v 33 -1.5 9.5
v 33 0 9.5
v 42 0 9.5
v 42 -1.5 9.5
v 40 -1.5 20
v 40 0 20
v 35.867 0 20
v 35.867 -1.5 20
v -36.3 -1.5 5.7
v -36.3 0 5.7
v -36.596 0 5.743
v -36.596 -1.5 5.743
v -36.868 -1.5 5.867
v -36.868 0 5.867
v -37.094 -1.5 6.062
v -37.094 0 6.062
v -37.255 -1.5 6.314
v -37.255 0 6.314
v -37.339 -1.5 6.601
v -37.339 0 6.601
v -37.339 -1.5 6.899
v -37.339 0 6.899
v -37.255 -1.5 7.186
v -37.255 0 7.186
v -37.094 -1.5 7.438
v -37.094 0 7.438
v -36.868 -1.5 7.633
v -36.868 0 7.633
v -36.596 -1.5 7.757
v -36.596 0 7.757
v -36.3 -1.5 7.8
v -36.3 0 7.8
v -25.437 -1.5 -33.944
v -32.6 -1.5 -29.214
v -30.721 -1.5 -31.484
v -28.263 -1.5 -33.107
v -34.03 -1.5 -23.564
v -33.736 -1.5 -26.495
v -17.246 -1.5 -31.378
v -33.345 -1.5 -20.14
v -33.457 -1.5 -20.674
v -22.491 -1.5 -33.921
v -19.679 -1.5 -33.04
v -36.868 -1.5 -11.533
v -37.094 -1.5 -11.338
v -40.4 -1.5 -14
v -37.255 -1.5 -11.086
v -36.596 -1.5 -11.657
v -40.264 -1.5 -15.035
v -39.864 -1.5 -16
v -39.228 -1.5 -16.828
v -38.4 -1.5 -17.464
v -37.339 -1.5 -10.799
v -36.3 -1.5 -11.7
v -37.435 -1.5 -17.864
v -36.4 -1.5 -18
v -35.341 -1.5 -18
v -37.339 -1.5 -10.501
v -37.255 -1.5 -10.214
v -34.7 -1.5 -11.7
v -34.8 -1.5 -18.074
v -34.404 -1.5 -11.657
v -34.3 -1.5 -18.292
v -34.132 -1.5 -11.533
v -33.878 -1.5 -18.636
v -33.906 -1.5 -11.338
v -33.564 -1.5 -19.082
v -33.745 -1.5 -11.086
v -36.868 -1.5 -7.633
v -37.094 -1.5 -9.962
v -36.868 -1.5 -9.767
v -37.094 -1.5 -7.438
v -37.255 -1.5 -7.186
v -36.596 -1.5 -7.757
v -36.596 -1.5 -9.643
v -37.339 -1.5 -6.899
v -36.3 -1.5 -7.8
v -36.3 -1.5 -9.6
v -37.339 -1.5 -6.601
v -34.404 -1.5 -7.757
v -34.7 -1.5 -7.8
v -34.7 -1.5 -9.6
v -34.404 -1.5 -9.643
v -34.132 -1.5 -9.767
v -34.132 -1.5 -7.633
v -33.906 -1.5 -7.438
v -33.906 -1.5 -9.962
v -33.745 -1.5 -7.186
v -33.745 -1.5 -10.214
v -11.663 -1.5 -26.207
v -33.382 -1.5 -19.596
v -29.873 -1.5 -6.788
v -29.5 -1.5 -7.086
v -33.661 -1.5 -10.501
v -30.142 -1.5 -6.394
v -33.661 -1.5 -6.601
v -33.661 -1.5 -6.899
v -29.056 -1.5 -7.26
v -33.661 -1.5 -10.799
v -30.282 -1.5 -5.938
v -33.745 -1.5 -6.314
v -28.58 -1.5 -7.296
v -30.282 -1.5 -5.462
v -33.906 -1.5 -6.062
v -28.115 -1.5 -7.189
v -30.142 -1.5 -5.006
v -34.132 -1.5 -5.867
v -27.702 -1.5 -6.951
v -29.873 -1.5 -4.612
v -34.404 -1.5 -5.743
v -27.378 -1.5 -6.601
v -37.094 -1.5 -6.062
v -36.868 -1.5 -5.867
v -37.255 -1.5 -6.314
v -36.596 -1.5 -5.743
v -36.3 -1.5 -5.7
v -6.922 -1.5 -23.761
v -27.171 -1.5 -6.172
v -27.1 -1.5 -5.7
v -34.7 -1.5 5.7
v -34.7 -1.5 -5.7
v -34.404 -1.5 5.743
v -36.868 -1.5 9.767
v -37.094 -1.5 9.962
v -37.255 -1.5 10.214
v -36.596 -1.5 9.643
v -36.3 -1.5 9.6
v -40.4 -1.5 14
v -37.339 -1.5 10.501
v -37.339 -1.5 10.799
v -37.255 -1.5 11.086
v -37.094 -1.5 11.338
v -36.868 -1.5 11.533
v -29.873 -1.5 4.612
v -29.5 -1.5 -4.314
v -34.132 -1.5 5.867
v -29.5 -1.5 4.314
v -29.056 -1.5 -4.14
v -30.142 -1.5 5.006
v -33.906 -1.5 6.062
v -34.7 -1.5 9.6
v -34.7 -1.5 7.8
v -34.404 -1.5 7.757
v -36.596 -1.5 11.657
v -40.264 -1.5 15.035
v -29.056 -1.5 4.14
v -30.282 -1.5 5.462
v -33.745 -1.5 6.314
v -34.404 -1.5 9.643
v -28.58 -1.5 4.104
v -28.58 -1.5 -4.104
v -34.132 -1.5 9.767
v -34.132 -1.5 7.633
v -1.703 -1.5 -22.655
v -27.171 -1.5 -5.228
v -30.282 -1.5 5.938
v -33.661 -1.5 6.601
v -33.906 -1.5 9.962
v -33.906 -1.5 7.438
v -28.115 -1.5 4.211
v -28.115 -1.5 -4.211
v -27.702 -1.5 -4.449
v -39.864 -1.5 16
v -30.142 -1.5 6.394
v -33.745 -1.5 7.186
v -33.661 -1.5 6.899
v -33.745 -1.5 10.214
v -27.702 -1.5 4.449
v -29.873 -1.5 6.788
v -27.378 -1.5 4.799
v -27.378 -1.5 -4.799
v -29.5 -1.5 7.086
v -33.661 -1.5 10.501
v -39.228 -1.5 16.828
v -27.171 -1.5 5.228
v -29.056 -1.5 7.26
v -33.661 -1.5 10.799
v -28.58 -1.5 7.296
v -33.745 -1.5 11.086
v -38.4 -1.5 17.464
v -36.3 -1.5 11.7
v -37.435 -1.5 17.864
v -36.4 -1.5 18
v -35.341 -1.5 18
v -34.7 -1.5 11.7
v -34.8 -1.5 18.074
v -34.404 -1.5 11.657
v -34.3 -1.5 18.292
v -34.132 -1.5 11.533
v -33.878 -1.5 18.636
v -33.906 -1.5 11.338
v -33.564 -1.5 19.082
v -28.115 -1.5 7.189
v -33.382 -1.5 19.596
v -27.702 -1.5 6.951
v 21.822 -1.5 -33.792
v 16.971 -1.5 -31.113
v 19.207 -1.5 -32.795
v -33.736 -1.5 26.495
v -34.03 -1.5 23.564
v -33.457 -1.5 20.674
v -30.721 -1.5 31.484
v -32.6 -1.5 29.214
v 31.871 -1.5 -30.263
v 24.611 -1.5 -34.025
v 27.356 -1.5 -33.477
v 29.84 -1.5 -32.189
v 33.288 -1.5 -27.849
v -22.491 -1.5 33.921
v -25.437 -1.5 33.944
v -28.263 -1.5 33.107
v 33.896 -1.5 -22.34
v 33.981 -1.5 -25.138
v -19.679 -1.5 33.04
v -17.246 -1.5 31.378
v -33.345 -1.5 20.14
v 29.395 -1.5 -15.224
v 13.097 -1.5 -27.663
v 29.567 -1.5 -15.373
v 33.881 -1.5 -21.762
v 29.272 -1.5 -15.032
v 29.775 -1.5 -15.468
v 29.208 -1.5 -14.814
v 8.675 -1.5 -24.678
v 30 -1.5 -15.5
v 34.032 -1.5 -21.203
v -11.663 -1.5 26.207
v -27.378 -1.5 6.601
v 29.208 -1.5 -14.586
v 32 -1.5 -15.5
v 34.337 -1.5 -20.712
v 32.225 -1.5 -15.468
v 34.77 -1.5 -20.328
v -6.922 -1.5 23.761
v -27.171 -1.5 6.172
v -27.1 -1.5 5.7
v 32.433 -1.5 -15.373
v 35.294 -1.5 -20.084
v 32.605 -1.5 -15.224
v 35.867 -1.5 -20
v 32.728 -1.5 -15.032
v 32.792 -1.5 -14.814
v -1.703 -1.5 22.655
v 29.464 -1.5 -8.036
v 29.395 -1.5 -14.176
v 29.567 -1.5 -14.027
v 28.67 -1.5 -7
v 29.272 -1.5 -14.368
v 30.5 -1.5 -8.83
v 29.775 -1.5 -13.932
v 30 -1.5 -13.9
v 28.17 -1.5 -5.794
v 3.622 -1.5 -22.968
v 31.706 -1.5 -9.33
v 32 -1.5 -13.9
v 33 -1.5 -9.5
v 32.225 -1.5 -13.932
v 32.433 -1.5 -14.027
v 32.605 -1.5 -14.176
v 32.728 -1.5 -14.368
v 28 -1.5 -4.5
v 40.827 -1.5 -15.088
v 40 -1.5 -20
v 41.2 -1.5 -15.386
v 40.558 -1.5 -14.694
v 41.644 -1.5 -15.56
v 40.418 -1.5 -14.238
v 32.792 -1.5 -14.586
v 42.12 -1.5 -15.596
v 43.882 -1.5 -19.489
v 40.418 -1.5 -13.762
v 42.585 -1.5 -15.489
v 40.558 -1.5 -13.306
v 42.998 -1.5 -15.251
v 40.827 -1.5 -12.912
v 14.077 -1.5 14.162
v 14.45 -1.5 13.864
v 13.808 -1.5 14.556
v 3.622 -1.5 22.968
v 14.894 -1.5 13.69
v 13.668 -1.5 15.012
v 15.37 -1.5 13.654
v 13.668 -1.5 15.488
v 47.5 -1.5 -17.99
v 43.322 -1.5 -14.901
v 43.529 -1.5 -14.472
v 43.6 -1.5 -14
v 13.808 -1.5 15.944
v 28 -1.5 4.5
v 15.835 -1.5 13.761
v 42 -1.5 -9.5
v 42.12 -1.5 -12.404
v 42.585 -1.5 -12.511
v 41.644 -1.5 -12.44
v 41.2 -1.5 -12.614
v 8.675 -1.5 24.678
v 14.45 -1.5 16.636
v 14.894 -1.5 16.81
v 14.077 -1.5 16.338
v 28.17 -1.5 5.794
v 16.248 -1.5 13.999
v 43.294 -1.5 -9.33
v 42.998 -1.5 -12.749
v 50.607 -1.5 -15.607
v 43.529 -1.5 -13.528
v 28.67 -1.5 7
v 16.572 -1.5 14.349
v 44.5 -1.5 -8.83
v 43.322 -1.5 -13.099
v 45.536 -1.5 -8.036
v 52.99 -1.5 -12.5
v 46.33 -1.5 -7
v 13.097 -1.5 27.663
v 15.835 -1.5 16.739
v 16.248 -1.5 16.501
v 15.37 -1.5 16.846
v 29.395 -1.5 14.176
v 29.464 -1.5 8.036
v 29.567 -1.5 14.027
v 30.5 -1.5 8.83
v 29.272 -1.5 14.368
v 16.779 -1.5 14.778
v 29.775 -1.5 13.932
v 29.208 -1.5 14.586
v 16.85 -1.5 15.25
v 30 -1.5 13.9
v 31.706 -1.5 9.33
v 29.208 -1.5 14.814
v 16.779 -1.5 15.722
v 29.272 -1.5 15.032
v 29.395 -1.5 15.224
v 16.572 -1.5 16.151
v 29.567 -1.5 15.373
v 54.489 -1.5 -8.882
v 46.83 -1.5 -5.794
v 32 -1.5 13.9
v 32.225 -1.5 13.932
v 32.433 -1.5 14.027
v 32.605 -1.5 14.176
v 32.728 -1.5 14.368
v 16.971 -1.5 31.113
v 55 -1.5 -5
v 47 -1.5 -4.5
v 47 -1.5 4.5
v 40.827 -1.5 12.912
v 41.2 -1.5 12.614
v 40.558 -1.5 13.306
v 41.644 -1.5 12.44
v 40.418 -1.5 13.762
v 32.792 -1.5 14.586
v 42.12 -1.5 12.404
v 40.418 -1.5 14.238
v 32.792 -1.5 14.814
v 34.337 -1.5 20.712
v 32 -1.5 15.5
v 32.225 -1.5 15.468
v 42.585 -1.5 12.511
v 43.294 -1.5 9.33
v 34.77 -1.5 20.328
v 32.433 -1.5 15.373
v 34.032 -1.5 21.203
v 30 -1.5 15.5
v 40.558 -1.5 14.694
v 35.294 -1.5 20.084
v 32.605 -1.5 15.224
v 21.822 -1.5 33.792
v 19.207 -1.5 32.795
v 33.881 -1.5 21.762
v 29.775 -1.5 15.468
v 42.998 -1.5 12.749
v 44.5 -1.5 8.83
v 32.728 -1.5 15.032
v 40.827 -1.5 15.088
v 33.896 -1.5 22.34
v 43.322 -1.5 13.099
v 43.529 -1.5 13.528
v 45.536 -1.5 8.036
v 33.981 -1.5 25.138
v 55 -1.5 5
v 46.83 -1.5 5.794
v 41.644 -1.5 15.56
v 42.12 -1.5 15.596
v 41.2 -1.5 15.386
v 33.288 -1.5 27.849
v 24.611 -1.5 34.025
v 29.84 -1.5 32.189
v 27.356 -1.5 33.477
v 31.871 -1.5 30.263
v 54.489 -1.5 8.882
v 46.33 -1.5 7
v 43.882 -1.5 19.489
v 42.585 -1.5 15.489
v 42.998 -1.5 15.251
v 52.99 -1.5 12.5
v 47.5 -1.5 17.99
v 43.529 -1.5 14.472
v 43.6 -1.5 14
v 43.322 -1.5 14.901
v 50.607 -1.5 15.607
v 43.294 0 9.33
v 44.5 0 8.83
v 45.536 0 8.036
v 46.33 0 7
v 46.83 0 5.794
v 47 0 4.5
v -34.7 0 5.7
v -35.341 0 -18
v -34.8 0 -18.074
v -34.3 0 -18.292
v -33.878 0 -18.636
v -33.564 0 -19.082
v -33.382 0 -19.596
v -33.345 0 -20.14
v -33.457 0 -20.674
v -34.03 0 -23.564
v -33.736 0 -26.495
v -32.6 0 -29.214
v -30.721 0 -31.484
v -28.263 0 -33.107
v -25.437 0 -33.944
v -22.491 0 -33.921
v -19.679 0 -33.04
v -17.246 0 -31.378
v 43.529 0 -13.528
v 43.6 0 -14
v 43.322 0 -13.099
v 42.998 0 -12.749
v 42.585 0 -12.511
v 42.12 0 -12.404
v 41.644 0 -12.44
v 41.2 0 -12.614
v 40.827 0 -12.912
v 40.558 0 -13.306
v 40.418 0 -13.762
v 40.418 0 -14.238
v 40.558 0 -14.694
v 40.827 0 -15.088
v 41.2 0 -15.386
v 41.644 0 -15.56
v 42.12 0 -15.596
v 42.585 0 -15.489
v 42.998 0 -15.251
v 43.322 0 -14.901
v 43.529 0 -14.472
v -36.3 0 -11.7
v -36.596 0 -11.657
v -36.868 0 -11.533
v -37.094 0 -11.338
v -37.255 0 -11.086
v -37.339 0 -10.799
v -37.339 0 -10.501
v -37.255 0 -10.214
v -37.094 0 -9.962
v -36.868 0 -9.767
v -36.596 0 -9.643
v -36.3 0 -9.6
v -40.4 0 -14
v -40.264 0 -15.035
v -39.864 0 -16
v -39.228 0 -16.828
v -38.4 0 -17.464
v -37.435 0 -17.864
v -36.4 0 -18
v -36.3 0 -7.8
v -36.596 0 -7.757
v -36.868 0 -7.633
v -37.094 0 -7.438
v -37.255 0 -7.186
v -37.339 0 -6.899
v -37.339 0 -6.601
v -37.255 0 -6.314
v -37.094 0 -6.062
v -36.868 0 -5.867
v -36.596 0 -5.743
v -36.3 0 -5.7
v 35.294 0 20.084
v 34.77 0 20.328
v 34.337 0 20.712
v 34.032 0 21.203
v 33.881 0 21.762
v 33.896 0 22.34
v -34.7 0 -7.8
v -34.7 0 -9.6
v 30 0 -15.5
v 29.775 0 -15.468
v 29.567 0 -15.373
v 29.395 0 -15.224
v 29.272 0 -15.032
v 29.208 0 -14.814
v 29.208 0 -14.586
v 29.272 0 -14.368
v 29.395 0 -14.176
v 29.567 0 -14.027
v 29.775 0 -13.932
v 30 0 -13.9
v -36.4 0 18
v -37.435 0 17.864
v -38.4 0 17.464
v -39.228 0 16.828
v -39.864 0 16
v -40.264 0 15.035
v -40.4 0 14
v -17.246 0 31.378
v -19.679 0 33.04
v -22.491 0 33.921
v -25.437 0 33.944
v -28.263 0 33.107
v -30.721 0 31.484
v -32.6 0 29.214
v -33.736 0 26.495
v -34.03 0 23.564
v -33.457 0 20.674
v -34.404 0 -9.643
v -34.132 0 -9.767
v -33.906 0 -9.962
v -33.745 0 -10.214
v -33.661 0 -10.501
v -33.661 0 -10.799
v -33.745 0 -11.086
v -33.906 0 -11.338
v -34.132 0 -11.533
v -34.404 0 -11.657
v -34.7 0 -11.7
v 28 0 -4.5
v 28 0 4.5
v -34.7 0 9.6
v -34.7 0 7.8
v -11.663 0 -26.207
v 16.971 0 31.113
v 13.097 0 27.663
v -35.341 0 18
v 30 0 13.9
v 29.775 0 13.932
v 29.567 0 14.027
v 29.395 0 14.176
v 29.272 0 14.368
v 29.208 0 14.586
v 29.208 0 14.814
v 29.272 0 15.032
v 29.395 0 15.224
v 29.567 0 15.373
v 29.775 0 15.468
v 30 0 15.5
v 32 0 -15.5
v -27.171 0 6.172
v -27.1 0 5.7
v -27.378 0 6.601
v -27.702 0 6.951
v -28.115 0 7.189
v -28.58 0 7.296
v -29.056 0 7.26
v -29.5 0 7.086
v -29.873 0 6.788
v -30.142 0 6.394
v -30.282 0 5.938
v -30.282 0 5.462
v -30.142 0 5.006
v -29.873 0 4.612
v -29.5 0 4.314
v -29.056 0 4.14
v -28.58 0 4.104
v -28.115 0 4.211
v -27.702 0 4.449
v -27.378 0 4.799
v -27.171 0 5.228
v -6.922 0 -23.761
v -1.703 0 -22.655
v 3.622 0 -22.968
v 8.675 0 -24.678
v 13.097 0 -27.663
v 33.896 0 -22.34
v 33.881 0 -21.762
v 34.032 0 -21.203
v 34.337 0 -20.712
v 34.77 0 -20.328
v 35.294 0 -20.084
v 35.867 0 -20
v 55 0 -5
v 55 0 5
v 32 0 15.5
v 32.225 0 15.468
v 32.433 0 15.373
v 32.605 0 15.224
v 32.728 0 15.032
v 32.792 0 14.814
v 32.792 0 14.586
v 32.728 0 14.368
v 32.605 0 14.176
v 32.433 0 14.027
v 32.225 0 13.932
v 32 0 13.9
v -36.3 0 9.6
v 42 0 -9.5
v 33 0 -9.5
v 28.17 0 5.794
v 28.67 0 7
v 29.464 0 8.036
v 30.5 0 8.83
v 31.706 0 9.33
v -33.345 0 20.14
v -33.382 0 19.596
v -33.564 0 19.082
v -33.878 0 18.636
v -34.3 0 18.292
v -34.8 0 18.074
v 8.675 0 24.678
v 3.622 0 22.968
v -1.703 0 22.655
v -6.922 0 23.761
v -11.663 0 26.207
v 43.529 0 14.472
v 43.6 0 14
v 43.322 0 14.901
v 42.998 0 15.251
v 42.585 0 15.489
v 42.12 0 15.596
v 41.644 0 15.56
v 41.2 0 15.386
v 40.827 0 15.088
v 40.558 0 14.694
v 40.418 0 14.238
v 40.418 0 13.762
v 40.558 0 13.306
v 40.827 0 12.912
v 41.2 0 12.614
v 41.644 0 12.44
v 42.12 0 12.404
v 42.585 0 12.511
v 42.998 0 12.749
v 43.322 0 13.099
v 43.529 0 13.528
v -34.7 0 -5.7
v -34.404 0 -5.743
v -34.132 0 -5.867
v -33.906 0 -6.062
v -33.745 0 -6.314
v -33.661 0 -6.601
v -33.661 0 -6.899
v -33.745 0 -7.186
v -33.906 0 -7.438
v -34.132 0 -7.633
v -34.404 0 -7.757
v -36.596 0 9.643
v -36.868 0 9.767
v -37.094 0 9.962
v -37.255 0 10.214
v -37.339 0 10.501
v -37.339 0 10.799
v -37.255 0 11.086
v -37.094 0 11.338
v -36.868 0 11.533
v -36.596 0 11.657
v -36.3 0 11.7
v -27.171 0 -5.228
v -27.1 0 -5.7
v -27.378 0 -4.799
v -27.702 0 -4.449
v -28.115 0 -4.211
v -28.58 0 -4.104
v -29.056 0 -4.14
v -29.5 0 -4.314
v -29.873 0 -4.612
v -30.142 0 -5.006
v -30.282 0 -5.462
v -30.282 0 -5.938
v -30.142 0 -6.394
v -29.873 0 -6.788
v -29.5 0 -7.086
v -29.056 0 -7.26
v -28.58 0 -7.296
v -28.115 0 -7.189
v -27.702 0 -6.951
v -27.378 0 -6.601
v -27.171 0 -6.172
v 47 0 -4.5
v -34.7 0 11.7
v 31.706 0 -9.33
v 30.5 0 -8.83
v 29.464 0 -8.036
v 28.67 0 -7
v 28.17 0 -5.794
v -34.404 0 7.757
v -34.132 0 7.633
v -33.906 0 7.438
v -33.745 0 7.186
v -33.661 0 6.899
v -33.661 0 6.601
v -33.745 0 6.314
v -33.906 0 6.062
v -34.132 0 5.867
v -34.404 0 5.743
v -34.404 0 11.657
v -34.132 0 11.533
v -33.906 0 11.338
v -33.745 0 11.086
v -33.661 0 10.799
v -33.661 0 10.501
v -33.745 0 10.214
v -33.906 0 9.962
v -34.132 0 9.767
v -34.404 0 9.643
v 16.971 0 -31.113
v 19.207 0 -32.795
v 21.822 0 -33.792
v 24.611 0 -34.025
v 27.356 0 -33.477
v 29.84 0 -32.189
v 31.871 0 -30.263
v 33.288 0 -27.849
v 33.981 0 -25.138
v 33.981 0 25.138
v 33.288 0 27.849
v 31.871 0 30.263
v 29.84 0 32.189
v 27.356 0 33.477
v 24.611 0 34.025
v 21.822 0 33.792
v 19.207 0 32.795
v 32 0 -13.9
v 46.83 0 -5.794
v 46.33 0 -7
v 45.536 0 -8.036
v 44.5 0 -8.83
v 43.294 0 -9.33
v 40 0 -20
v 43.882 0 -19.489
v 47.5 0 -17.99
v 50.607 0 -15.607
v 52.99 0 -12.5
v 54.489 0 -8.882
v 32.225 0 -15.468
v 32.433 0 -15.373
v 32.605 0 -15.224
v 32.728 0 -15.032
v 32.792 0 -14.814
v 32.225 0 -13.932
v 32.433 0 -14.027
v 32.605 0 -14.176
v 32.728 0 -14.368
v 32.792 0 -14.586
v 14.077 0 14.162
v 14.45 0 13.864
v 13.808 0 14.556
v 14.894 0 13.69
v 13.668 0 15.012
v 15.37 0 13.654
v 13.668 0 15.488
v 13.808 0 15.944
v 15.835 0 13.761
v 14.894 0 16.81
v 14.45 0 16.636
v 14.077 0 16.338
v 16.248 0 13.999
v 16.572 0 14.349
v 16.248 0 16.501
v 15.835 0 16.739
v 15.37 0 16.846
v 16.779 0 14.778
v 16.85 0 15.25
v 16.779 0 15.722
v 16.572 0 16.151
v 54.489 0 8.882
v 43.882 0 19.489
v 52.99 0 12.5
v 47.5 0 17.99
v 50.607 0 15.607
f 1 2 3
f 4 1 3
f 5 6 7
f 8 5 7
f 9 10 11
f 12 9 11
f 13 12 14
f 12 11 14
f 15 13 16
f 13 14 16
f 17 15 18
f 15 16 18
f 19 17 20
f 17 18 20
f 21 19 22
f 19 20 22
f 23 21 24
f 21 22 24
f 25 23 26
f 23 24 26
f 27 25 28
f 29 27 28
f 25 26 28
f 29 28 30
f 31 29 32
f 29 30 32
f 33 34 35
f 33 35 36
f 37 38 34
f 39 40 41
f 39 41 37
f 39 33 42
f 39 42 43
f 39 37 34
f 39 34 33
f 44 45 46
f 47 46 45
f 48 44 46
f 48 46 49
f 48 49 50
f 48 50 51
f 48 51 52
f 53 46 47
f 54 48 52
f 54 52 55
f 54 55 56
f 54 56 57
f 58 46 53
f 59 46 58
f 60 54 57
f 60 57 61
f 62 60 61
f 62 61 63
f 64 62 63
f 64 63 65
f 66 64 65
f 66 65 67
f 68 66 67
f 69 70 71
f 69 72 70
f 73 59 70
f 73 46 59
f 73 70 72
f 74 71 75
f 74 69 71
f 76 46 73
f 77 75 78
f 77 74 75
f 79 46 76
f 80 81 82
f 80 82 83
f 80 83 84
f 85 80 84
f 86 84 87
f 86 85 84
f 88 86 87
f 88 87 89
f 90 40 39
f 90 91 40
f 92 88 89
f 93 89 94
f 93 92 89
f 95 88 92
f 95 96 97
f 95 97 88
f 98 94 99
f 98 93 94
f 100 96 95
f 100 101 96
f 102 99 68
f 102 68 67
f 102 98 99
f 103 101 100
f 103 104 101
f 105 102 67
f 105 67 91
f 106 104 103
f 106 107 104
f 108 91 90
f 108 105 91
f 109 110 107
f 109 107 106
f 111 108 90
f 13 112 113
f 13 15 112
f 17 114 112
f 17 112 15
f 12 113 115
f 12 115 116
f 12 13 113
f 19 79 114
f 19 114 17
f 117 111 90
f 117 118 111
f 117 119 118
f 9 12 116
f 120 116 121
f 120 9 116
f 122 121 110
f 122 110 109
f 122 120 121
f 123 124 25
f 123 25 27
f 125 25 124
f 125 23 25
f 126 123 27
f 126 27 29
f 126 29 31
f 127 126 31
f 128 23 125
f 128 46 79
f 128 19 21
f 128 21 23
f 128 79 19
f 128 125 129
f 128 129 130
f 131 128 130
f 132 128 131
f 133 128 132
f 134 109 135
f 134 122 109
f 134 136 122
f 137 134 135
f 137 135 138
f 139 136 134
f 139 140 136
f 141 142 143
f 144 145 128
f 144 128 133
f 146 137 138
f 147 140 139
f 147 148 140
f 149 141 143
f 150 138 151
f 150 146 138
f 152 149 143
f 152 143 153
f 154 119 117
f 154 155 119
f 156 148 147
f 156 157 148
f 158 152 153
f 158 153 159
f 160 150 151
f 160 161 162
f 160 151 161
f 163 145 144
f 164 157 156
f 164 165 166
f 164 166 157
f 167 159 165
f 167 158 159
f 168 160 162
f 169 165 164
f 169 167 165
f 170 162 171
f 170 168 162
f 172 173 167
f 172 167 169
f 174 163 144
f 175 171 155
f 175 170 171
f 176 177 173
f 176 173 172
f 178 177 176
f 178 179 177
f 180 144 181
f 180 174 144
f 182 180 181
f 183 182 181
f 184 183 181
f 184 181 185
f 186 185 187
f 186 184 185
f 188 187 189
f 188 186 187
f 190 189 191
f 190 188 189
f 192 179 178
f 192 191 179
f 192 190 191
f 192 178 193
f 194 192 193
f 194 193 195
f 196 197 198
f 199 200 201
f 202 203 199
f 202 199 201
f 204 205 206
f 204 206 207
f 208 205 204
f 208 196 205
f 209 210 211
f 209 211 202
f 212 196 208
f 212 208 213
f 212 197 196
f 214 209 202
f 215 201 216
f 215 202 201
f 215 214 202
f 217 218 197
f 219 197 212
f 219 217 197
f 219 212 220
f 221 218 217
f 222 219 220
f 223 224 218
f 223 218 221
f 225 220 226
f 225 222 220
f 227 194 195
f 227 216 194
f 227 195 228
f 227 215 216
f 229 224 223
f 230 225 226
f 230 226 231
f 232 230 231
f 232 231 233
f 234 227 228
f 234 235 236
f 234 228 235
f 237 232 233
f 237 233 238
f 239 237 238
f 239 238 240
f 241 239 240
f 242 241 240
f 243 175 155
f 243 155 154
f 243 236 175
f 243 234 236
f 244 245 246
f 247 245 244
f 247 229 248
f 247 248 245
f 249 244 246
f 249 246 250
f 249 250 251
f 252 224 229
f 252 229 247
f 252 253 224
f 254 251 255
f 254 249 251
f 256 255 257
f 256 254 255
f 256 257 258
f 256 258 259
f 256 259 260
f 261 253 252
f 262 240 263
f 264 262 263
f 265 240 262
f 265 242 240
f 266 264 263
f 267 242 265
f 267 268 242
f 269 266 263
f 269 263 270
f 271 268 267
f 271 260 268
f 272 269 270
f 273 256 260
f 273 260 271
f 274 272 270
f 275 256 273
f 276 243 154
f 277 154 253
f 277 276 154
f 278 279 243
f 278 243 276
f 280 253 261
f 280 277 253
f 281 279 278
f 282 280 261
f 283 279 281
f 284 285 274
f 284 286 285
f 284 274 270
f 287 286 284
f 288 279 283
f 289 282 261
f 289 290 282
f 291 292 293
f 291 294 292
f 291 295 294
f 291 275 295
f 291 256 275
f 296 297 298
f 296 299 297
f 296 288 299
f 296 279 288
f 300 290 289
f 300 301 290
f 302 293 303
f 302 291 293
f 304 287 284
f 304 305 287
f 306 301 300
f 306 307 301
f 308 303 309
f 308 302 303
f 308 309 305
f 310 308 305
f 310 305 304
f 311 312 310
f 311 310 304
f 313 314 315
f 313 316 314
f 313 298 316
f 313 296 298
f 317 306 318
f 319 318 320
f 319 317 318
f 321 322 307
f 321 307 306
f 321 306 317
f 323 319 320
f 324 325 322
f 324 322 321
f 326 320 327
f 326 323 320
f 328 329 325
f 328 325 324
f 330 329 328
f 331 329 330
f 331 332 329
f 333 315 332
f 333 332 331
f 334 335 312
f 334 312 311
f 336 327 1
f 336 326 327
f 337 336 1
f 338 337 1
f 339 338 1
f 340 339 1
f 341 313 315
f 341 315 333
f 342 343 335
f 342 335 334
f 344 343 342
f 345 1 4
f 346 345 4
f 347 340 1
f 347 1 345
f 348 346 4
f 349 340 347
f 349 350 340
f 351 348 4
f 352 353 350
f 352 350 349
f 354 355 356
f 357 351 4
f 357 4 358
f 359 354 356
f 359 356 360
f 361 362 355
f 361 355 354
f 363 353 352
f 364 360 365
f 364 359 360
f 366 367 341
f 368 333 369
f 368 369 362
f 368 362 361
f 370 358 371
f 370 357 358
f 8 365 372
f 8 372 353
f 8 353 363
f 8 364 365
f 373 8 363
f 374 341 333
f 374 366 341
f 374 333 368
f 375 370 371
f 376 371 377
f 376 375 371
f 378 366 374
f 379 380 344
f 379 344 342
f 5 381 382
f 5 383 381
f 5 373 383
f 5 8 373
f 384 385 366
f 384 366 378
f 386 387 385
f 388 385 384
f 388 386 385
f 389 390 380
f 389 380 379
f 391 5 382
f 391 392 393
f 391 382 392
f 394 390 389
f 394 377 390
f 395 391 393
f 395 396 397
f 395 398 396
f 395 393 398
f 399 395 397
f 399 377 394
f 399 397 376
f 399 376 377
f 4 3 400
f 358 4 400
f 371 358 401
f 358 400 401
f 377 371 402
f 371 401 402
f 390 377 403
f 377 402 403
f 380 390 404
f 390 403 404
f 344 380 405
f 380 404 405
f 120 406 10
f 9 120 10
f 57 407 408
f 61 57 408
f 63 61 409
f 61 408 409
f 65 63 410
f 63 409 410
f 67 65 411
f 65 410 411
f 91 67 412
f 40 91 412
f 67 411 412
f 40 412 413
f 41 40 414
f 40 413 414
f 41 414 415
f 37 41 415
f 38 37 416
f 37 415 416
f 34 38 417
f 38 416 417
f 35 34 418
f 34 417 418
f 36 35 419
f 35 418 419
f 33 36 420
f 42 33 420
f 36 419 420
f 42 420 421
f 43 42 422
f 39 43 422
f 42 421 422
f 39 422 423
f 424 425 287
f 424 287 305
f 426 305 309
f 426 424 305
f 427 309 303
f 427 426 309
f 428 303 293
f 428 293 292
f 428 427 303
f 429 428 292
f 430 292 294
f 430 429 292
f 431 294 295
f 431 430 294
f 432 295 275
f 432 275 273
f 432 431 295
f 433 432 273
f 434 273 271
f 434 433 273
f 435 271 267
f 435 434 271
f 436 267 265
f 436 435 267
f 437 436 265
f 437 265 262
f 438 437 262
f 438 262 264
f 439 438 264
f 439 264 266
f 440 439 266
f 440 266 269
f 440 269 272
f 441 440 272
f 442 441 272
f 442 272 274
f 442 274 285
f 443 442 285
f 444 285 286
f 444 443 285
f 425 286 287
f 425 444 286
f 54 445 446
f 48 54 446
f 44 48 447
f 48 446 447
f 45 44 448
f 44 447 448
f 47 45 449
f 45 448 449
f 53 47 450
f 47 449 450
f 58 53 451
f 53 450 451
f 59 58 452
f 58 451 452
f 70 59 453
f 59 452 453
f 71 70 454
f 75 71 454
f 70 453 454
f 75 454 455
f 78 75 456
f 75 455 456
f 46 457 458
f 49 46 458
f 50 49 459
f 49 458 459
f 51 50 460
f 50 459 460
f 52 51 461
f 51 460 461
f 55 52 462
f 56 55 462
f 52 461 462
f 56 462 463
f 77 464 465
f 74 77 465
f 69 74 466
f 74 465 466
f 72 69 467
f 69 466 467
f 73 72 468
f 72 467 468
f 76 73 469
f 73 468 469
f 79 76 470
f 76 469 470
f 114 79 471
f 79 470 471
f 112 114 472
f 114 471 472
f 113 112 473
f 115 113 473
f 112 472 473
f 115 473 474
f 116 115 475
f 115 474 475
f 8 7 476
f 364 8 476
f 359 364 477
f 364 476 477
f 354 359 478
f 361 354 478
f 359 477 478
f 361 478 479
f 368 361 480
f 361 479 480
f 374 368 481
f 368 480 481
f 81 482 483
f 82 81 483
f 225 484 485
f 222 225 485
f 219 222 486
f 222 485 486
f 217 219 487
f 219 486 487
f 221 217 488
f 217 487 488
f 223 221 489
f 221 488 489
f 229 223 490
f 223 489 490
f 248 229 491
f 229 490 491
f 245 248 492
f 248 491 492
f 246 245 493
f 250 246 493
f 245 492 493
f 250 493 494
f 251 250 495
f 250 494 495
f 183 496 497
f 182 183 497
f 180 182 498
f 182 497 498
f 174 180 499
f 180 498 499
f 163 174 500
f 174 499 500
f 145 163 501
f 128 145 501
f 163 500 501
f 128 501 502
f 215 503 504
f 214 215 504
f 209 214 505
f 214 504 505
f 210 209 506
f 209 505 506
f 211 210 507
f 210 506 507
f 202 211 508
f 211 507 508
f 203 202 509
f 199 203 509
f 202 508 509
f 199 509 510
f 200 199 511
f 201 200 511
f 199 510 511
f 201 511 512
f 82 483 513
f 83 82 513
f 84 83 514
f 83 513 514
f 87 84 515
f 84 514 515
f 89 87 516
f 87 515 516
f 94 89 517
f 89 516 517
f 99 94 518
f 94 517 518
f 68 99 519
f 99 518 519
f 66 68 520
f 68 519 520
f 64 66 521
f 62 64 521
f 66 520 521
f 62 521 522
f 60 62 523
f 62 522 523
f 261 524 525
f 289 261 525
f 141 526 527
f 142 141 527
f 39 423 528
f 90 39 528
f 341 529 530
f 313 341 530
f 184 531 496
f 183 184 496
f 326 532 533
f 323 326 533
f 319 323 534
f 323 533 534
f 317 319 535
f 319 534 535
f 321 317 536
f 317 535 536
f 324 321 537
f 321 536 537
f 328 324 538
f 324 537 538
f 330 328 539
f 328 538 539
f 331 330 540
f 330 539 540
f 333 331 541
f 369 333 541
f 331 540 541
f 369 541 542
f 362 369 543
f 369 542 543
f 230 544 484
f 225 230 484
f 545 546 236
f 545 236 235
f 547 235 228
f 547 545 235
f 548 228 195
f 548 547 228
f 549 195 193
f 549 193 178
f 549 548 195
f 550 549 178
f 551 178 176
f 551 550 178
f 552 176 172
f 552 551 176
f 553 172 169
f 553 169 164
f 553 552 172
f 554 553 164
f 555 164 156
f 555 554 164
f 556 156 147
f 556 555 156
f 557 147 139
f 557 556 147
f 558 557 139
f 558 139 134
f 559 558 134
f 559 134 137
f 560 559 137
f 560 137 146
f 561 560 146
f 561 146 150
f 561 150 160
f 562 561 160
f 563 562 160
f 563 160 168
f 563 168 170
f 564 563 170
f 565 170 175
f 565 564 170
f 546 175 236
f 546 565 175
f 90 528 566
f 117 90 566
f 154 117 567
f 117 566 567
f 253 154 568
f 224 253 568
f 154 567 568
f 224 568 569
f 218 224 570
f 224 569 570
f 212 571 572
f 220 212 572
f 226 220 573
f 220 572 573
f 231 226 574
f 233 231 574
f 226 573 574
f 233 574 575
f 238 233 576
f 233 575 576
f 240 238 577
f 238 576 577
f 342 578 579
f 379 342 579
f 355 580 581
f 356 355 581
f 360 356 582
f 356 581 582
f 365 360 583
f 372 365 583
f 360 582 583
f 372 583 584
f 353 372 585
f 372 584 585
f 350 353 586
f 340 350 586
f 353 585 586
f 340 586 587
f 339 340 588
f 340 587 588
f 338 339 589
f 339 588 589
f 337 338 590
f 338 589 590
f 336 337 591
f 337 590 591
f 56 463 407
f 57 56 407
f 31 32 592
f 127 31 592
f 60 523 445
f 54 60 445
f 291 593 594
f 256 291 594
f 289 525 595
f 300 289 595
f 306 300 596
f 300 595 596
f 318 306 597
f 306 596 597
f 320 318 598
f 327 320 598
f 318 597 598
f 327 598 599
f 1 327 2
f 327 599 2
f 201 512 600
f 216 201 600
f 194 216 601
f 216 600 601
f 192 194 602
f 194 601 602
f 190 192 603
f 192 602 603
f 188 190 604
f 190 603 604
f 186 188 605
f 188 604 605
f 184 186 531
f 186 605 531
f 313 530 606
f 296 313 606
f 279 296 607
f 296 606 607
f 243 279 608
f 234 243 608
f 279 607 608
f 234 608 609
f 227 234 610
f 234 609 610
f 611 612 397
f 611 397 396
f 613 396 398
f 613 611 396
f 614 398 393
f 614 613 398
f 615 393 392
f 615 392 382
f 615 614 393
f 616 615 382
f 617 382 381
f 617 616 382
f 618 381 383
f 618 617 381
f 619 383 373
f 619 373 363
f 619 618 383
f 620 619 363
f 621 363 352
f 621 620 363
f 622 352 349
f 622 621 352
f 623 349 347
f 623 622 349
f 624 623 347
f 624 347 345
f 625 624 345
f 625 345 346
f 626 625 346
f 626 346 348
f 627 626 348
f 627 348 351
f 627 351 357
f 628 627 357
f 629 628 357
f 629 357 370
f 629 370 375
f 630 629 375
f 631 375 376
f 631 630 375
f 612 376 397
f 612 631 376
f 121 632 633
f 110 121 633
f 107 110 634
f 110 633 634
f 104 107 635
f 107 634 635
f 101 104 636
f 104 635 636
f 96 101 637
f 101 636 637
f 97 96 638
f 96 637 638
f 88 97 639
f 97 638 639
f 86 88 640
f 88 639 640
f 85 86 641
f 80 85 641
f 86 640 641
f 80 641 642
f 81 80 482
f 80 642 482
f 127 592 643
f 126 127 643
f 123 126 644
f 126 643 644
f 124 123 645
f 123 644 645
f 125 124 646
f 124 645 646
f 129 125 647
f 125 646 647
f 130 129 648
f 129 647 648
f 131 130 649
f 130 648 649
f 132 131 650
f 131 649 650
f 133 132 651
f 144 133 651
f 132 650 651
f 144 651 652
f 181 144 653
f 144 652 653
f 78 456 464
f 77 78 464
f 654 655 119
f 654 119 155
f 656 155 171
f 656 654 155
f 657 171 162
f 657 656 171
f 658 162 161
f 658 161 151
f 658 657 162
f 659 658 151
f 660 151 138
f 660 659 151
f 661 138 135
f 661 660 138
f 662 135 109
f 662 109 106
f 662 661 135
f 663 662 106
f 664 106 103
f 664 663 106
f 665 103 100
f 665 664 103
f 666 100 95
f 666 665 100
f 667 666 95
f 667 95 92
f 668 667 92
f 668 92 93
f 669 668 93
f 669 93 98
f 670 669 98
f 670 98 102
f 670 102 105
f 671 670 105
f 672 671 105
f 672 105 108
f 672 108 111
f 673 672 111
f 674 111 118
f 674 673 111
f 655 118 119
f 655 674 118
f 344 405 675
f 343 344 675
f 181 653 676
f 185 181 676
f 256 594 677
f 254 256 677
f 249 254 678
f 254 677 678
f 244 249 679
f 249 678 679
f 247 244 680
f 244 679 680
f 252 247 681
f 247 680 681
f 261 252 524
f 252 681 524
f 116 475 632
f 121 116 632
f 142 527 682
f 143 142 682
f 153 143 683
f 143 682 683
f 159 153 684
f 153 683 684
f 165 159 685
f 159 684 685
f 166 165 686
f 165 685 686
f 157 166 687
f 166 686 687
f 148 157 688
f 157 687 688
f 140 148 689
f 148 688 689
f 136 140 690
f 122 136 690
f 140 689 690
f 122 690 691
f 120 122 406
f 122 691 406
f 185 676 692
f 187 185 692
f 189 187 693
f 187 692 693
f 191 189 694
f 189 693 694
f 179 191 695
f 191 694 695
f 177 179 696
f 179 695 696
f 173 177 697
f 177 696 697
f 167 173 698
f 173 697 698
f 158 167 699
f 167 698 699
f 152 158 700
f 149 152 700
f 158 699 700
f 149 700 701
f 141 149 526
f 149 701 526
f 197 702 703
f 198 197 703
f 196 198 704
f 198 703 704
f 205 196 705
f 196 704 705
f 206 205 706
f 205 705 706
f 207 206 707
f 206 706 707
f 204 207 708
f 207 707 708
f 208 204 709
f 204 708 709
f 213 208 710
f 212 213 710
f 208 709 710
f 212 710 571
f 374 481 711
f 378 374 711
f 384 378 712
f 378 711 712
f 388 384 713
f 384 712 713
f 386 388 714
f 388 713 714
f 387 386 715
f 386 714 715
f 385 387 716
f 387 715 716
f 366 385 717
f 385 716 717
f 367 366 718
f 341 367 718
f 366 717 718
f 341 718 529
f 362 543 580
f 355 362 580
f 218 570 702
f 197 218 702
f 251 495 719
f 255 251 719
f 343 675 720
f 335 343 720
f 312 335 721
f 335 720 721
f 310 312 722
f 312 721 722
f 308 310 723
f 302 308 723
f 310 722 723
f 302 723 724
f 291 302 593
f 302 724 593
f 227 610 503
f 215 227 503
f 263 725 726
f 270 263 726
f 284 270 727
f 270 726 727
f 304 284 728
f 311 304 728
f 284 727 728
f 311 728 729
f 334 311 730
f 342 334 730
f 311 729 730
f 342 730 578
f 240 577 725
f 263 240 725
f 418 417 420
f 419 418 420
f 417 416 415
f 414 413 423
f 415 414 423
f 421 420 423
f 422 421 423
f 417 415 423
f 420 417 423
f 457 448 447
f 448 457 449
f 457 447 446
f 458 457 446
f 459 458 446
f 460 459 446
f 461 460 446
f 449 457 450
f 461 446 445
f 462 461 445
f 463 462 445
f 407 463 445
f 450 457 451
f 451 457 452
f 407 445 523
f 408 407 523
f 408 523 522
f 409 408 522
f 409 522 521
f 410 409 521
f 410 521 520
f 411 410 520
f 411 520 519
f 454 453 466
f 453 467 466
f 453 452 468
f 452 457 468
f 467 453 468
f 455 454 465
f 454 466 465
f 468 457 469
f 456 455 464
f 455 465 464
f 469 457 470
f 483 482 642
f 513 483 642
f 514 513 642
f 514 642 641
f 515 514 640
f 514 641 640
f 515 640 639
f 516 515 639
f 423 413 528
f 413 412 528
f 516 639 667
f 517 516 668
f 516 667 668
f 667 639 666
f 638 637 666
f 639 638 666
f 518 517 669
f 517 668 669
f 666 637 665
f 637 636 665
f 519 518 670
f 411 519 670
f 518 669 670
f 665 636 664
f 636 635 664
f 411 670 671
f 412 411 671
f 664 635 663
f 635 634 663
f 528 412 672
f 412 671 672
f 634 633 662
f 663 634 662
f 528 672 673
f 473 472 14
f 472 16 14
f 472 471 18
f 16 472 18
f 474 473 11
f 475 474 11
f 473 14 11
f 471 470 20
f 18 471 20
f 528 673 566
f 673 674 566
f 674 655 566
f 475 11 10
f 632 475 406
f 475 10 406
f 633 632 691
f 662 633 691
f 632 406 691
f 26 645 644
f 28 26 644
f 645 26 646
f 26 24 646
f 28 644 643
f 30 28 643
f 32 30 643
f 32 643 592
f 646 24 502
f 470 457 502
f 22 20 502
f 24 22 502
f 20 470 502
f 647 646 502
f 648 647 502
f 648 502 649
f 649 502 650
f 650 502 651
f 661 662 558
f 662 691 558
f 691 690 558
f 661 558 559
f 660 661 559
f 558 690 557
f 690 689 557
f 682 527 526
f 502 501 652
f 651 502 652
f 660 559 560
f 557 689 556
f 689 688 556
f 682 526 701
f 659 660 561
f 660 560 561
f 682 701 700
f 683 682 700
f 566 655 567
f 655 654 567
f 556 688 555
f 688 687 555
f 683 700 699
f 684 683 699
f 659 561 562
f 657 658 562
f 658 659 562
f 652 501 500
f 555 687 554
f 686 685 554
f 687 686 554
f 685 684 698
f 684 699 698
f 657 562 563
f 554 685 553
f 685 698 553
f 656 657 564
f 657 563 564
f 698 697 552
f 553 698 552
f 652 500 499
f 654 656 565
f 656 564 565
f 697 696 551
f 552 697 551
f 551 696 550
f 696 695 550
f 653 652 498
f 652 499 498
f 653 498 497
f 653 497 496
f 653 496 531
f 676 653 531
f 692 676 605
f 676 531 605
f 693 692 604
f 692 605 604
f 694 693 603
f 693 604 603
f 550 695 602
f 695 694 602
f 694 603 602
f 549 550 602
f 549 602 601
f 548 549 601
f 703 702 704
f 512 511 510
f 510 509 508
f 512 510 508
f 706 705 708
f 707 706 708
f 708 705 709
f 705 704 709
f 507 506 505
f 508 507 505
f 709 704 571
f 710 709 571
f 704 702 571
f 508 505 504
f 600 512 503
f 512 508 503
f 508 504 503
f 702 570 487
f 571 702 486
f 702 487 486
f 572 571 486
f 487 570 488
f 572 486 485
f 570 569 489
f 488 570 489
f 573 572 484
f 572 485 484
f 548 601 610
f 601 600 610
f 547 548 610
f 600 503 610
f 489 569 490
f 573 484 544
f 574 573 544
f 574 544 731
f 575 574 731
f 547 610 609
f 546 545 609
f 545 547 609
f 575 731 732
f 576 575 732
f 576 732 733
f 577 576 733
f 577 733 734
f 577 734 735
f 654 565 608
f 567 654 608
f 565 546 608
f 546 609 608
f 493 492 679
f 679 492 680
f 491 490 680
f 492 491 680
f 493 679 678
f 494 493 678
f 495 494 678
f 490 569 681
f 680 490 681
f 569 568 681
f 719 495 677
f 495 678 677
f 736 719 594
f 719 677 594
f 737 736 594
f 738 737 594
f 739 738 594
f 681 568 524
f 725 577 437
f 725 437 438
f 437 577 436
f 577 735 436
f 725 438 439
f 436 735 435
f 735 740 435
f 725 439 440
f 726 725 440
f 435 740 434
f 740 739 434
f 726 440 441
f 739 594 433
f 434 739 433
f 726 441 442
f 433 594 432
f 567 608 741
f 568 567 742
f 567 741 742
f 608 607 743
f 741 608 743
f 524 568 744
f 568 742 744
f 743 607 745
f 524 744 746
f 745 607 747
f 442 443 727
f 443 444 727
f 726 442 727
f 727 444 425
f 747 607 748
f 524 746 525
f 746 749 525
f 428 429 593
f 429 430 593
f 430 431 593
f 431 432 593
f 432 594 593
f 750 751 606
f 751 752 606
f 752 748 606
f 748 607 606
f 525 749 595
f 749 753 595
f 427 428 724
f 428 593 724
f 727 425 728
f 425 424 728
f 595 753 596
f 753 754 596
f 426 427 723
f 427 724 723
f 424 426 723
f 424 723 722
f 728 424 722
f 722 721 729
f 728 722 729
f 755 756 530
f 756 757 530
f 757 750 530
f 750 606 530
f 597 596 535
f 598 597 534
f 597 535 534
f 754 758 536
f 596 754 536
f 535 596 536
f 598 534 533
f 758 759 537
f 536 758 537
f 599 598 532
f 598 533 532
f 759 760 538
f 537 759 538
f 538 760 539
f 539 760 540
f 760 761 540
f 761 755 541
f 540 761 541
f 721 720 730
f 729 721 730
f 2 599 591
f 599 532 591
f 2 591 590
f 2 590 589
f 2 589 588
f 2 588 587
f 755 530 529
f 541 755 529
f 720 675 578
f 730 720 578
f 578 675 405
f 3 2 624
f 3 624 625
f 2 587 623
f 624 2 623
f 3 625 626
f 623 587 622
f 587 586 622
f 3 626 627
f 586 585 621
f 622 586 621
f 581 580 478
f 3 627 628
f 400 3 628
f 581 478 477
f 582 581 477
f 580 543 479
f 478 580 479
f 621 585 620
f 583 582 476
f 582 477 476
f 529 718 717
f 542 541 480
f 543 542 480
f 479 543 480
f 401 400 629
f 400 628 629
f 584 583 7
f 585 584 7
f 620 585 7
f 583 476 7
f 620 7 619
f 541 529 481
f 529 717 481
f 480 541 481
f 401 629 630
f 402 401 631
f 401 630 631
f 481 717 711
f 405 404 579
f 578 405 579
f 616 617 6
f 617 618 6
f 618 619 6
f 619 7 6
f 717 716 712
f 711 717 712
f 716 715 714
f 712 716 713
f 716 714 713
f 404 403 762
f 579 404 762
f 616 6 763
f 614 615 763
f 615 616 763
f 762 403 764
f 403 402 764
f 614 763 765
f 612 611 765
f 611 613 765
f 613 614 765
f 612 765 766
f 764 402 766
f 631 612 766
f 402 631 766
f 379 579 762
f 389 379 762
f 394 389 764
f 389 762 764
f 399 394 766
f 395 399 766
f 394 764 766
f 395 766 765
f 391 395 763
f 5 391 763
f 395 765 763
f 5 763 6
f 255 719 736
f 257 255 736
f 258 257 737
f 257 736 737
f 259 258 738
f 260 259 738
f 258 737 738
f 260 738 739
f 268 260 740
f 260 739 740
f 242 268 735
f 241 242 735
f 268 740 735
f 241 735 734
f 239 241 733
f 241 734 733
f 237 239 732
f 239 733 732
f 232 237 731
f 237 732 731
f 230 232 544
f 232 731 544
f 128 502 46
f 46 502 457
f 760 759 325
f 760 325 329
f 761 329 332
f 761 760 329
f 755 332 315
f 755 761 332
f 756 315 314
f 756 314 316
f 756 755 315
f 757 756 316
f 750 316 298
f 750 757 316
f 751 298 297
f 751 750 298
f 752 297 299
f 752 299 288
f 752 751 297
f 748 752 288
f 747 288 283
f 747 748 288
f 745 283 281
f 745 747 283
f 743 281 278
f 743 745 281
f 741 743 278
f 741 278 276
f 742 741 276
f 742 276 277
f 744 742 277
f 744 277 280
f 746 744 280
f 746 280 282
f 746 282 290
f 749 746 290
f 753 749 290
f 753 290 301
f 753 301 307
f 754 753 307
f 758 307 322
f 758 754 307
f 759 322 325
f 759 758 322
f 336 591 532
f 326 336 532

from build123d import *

# Parameters (mm, degrees)
F0_R     = 1.6
F1_DEPTH = 1.5


with BuildPart() as f1:
    # F0 (on Front) → F1 (new body)
    with BuildSketch(Plane.XZ):
        with BuildLine():
            ThreePointArc((33.895837, 22.340272), (28.643297, 32.919956), (16.970563, 31.112698))
            Line((16.970563, 31.112698), (13.096545, 27.662792))
            ThreePointArc((13.096545, 27.662792), (0.969919, 22.633346), (-11.662681, 26.206554))
            Line((-11.662681, 26.206554), (-17.246483, 31.378249))
            ThreePointArc((-17.246483, 31.378249), (-29.552007, 32.386435), (-33.457384, 20.673605))
            ThreePointArc((-33.457384, 20.673605), (-33.705418, 18.848308), (-35.340534, 18))
            Line((-35.340534, 18), (-36.4, 18))
            ThreePointArc((-36.4, 18), (-39.228427, 16.828427), (-40.4, 14))
            Line((-40.4, 14), (-40.4, 0))
            Line((-40.4, 0), (-40.4, -14))
            ThreePointArc((-40.4, -14), (-39.228427, -16.828427), (-36.4, -18))
            Line((-36.4, -18), (-35.340534, -18))
            ThreePointArc((-35.340534, -18), (-33.705418, -18.848308), (-33.457384, -20.673605))
            ThreePointArc((-33.457384, -20.673605), (-29.552007, -32.386435), (-17.246483, -31.378249))
            Line((-17.246483, -31.378249), (-11.662681, -26.206554))
            ThreePointArc((-11.662681, -26.206554), (0.969919, -22.633346), (13.096545, -27.662792))
            Line((13.096545, -27.662792), (16.970563, -31.112698))
            ThreePointArc((16.970563, -31.112698), (28.643297, -32.919956), (33.895837, -22.340272))
            ThreePointArc((33.895837, -22.340272), (34.336883, -20.711696), (35.866678, -20))
            Line((35.866678, -20), (40, -20))
            ThreePointArc((40, -20), (50.606602, -15.606602), (55, -5))
            Line((55, -5), (55, 0))
            Line((55, 0), (55, 5))
            ThreePointArc((55, 5), (50.606602, 15.606602), (40, 20))
            Line((40, 20), (35.866678, 20))
            ThreePointArc((35.866678, 20), (34.336883, 20.711696), (33.895837, 22.340272))
        make_face()
        with BuildLine():
            ThreePointArc((-34.7, -9.6), (-33.65, -10.65), (-34.7, -11.7))
            Line((-34.7, -11.7), (-36.3, -11.7))
            ThreePointArc((-36.3, -11.7), (-37.35, -10.65), (-36.3, -9.6))
            Line((-36.3, -9.6), (-36.3, -7.8))
            ThreePointArc((-36.3, -7.8), (-37.35, -6.75), (-36.3, -5.7))
            Line((-36.3, -5.7), (-34.7, -5.7))
            ThreePointArc((-34.7, -5.7), (-33.65, -6.75), (-34.7, -7.8))
            Line((-34.7, -7.8), (-34.7, -9.6))
        make_face(mode=Mode.SUBTRACT)
        with Locations((-28.7, -5.7)):
            Circle(F0_R, mode=Mode.SUBTRACT)
        with BuildLine():
            Line((30, -13.9), (32, -13.9))
            ThreePointArc((32, -13.9), (32.8, -14.7), (32, -15.5))
            Line((32, -15.5), (30, -15.5))
            ThreePointArc((30, -15.5), (29.2, -14.7), (30, -13.9))
        make_face(mode=Mode.SUBTRACT)
        with Locations((42, -14)):
            Circle(F0_R, mode=Mode.SUBTRACT)
        with Locations((-28.7, 5.7)):
            Circle(F0_R, mode=Mode.SUBTRACT)
        with BuildLine():
            ThreePointArc((-34.7, 7.8), (-33.65, 6.75), (-34.7, 5.7))
            Line((-34.7, 5.7), (-36.3, 5.7))
            ThreePointArc((-36.3, 5.7), (-37.35, 6.75), (-36.3, 7.8))
            Line((-36.3, 7.8), (-36.3, 9.6))
            ThreePointArc((-36.3, 9.6), (-37.35, 10.65), (-36.3, 11.7))
            Line((-36.3, 11.7), (-34.7, 11.7))
            ThreePointArc((-34.7, 11.7), (-33.65, 10.65), (-34.7, 9.6))
            Line((-34.7, 9.6), (-34.7, 7.8))
        make_face(mode=Mode.SUBTRACT)
        with Locations((15.25, 15.25)):
            Circle(F0_R, mode=Mode.SUBTRACT)
        with BuildLine():
            ThreePointArc((30, 13.9), (29.2, 14.7), (30, 15.5))
            Line((30, 15.5), (32, 15.5))
            ThreePointArc((32, 15.5), (32.8, 14.7), (32, 13.9))
            Line((32, 13.9), (30, 13.9))
        make_face(mode=Mode.SUBTRACT)
        with BuildLine():
            Line((28, -4.5), (28, 0))
            Line((28, 0), (28, 4.5))
            ThreePointArc((28, 4.5), (29.464466, 8.035534), (33, 9.5))
            Line((33, 9.5), (42, 9.5))
            ThreePointArc((42, 9.5), (45.535534, 8.035534), (47, 4.5))
            Line((47, 4.5), (47, 0))
            Line((47, 0), (47, -4.5))
            ThreePointArc((47, -4.5), (45.535534, -8.035534), (42, -9.5))
            Line((42, -9.5), (33, -9.5))
            ThreePointArc((33, -9.5), (29.464466, -8.035534), (28, -4.5))
        make_face(mode=Mode.SUBTRACT)
        with Locations((42, 14)):
            Circle(F0_R, mode=Mode.SUBTRACT)
    extrude(amount=F1_DEPTH)


solid = f1.part
